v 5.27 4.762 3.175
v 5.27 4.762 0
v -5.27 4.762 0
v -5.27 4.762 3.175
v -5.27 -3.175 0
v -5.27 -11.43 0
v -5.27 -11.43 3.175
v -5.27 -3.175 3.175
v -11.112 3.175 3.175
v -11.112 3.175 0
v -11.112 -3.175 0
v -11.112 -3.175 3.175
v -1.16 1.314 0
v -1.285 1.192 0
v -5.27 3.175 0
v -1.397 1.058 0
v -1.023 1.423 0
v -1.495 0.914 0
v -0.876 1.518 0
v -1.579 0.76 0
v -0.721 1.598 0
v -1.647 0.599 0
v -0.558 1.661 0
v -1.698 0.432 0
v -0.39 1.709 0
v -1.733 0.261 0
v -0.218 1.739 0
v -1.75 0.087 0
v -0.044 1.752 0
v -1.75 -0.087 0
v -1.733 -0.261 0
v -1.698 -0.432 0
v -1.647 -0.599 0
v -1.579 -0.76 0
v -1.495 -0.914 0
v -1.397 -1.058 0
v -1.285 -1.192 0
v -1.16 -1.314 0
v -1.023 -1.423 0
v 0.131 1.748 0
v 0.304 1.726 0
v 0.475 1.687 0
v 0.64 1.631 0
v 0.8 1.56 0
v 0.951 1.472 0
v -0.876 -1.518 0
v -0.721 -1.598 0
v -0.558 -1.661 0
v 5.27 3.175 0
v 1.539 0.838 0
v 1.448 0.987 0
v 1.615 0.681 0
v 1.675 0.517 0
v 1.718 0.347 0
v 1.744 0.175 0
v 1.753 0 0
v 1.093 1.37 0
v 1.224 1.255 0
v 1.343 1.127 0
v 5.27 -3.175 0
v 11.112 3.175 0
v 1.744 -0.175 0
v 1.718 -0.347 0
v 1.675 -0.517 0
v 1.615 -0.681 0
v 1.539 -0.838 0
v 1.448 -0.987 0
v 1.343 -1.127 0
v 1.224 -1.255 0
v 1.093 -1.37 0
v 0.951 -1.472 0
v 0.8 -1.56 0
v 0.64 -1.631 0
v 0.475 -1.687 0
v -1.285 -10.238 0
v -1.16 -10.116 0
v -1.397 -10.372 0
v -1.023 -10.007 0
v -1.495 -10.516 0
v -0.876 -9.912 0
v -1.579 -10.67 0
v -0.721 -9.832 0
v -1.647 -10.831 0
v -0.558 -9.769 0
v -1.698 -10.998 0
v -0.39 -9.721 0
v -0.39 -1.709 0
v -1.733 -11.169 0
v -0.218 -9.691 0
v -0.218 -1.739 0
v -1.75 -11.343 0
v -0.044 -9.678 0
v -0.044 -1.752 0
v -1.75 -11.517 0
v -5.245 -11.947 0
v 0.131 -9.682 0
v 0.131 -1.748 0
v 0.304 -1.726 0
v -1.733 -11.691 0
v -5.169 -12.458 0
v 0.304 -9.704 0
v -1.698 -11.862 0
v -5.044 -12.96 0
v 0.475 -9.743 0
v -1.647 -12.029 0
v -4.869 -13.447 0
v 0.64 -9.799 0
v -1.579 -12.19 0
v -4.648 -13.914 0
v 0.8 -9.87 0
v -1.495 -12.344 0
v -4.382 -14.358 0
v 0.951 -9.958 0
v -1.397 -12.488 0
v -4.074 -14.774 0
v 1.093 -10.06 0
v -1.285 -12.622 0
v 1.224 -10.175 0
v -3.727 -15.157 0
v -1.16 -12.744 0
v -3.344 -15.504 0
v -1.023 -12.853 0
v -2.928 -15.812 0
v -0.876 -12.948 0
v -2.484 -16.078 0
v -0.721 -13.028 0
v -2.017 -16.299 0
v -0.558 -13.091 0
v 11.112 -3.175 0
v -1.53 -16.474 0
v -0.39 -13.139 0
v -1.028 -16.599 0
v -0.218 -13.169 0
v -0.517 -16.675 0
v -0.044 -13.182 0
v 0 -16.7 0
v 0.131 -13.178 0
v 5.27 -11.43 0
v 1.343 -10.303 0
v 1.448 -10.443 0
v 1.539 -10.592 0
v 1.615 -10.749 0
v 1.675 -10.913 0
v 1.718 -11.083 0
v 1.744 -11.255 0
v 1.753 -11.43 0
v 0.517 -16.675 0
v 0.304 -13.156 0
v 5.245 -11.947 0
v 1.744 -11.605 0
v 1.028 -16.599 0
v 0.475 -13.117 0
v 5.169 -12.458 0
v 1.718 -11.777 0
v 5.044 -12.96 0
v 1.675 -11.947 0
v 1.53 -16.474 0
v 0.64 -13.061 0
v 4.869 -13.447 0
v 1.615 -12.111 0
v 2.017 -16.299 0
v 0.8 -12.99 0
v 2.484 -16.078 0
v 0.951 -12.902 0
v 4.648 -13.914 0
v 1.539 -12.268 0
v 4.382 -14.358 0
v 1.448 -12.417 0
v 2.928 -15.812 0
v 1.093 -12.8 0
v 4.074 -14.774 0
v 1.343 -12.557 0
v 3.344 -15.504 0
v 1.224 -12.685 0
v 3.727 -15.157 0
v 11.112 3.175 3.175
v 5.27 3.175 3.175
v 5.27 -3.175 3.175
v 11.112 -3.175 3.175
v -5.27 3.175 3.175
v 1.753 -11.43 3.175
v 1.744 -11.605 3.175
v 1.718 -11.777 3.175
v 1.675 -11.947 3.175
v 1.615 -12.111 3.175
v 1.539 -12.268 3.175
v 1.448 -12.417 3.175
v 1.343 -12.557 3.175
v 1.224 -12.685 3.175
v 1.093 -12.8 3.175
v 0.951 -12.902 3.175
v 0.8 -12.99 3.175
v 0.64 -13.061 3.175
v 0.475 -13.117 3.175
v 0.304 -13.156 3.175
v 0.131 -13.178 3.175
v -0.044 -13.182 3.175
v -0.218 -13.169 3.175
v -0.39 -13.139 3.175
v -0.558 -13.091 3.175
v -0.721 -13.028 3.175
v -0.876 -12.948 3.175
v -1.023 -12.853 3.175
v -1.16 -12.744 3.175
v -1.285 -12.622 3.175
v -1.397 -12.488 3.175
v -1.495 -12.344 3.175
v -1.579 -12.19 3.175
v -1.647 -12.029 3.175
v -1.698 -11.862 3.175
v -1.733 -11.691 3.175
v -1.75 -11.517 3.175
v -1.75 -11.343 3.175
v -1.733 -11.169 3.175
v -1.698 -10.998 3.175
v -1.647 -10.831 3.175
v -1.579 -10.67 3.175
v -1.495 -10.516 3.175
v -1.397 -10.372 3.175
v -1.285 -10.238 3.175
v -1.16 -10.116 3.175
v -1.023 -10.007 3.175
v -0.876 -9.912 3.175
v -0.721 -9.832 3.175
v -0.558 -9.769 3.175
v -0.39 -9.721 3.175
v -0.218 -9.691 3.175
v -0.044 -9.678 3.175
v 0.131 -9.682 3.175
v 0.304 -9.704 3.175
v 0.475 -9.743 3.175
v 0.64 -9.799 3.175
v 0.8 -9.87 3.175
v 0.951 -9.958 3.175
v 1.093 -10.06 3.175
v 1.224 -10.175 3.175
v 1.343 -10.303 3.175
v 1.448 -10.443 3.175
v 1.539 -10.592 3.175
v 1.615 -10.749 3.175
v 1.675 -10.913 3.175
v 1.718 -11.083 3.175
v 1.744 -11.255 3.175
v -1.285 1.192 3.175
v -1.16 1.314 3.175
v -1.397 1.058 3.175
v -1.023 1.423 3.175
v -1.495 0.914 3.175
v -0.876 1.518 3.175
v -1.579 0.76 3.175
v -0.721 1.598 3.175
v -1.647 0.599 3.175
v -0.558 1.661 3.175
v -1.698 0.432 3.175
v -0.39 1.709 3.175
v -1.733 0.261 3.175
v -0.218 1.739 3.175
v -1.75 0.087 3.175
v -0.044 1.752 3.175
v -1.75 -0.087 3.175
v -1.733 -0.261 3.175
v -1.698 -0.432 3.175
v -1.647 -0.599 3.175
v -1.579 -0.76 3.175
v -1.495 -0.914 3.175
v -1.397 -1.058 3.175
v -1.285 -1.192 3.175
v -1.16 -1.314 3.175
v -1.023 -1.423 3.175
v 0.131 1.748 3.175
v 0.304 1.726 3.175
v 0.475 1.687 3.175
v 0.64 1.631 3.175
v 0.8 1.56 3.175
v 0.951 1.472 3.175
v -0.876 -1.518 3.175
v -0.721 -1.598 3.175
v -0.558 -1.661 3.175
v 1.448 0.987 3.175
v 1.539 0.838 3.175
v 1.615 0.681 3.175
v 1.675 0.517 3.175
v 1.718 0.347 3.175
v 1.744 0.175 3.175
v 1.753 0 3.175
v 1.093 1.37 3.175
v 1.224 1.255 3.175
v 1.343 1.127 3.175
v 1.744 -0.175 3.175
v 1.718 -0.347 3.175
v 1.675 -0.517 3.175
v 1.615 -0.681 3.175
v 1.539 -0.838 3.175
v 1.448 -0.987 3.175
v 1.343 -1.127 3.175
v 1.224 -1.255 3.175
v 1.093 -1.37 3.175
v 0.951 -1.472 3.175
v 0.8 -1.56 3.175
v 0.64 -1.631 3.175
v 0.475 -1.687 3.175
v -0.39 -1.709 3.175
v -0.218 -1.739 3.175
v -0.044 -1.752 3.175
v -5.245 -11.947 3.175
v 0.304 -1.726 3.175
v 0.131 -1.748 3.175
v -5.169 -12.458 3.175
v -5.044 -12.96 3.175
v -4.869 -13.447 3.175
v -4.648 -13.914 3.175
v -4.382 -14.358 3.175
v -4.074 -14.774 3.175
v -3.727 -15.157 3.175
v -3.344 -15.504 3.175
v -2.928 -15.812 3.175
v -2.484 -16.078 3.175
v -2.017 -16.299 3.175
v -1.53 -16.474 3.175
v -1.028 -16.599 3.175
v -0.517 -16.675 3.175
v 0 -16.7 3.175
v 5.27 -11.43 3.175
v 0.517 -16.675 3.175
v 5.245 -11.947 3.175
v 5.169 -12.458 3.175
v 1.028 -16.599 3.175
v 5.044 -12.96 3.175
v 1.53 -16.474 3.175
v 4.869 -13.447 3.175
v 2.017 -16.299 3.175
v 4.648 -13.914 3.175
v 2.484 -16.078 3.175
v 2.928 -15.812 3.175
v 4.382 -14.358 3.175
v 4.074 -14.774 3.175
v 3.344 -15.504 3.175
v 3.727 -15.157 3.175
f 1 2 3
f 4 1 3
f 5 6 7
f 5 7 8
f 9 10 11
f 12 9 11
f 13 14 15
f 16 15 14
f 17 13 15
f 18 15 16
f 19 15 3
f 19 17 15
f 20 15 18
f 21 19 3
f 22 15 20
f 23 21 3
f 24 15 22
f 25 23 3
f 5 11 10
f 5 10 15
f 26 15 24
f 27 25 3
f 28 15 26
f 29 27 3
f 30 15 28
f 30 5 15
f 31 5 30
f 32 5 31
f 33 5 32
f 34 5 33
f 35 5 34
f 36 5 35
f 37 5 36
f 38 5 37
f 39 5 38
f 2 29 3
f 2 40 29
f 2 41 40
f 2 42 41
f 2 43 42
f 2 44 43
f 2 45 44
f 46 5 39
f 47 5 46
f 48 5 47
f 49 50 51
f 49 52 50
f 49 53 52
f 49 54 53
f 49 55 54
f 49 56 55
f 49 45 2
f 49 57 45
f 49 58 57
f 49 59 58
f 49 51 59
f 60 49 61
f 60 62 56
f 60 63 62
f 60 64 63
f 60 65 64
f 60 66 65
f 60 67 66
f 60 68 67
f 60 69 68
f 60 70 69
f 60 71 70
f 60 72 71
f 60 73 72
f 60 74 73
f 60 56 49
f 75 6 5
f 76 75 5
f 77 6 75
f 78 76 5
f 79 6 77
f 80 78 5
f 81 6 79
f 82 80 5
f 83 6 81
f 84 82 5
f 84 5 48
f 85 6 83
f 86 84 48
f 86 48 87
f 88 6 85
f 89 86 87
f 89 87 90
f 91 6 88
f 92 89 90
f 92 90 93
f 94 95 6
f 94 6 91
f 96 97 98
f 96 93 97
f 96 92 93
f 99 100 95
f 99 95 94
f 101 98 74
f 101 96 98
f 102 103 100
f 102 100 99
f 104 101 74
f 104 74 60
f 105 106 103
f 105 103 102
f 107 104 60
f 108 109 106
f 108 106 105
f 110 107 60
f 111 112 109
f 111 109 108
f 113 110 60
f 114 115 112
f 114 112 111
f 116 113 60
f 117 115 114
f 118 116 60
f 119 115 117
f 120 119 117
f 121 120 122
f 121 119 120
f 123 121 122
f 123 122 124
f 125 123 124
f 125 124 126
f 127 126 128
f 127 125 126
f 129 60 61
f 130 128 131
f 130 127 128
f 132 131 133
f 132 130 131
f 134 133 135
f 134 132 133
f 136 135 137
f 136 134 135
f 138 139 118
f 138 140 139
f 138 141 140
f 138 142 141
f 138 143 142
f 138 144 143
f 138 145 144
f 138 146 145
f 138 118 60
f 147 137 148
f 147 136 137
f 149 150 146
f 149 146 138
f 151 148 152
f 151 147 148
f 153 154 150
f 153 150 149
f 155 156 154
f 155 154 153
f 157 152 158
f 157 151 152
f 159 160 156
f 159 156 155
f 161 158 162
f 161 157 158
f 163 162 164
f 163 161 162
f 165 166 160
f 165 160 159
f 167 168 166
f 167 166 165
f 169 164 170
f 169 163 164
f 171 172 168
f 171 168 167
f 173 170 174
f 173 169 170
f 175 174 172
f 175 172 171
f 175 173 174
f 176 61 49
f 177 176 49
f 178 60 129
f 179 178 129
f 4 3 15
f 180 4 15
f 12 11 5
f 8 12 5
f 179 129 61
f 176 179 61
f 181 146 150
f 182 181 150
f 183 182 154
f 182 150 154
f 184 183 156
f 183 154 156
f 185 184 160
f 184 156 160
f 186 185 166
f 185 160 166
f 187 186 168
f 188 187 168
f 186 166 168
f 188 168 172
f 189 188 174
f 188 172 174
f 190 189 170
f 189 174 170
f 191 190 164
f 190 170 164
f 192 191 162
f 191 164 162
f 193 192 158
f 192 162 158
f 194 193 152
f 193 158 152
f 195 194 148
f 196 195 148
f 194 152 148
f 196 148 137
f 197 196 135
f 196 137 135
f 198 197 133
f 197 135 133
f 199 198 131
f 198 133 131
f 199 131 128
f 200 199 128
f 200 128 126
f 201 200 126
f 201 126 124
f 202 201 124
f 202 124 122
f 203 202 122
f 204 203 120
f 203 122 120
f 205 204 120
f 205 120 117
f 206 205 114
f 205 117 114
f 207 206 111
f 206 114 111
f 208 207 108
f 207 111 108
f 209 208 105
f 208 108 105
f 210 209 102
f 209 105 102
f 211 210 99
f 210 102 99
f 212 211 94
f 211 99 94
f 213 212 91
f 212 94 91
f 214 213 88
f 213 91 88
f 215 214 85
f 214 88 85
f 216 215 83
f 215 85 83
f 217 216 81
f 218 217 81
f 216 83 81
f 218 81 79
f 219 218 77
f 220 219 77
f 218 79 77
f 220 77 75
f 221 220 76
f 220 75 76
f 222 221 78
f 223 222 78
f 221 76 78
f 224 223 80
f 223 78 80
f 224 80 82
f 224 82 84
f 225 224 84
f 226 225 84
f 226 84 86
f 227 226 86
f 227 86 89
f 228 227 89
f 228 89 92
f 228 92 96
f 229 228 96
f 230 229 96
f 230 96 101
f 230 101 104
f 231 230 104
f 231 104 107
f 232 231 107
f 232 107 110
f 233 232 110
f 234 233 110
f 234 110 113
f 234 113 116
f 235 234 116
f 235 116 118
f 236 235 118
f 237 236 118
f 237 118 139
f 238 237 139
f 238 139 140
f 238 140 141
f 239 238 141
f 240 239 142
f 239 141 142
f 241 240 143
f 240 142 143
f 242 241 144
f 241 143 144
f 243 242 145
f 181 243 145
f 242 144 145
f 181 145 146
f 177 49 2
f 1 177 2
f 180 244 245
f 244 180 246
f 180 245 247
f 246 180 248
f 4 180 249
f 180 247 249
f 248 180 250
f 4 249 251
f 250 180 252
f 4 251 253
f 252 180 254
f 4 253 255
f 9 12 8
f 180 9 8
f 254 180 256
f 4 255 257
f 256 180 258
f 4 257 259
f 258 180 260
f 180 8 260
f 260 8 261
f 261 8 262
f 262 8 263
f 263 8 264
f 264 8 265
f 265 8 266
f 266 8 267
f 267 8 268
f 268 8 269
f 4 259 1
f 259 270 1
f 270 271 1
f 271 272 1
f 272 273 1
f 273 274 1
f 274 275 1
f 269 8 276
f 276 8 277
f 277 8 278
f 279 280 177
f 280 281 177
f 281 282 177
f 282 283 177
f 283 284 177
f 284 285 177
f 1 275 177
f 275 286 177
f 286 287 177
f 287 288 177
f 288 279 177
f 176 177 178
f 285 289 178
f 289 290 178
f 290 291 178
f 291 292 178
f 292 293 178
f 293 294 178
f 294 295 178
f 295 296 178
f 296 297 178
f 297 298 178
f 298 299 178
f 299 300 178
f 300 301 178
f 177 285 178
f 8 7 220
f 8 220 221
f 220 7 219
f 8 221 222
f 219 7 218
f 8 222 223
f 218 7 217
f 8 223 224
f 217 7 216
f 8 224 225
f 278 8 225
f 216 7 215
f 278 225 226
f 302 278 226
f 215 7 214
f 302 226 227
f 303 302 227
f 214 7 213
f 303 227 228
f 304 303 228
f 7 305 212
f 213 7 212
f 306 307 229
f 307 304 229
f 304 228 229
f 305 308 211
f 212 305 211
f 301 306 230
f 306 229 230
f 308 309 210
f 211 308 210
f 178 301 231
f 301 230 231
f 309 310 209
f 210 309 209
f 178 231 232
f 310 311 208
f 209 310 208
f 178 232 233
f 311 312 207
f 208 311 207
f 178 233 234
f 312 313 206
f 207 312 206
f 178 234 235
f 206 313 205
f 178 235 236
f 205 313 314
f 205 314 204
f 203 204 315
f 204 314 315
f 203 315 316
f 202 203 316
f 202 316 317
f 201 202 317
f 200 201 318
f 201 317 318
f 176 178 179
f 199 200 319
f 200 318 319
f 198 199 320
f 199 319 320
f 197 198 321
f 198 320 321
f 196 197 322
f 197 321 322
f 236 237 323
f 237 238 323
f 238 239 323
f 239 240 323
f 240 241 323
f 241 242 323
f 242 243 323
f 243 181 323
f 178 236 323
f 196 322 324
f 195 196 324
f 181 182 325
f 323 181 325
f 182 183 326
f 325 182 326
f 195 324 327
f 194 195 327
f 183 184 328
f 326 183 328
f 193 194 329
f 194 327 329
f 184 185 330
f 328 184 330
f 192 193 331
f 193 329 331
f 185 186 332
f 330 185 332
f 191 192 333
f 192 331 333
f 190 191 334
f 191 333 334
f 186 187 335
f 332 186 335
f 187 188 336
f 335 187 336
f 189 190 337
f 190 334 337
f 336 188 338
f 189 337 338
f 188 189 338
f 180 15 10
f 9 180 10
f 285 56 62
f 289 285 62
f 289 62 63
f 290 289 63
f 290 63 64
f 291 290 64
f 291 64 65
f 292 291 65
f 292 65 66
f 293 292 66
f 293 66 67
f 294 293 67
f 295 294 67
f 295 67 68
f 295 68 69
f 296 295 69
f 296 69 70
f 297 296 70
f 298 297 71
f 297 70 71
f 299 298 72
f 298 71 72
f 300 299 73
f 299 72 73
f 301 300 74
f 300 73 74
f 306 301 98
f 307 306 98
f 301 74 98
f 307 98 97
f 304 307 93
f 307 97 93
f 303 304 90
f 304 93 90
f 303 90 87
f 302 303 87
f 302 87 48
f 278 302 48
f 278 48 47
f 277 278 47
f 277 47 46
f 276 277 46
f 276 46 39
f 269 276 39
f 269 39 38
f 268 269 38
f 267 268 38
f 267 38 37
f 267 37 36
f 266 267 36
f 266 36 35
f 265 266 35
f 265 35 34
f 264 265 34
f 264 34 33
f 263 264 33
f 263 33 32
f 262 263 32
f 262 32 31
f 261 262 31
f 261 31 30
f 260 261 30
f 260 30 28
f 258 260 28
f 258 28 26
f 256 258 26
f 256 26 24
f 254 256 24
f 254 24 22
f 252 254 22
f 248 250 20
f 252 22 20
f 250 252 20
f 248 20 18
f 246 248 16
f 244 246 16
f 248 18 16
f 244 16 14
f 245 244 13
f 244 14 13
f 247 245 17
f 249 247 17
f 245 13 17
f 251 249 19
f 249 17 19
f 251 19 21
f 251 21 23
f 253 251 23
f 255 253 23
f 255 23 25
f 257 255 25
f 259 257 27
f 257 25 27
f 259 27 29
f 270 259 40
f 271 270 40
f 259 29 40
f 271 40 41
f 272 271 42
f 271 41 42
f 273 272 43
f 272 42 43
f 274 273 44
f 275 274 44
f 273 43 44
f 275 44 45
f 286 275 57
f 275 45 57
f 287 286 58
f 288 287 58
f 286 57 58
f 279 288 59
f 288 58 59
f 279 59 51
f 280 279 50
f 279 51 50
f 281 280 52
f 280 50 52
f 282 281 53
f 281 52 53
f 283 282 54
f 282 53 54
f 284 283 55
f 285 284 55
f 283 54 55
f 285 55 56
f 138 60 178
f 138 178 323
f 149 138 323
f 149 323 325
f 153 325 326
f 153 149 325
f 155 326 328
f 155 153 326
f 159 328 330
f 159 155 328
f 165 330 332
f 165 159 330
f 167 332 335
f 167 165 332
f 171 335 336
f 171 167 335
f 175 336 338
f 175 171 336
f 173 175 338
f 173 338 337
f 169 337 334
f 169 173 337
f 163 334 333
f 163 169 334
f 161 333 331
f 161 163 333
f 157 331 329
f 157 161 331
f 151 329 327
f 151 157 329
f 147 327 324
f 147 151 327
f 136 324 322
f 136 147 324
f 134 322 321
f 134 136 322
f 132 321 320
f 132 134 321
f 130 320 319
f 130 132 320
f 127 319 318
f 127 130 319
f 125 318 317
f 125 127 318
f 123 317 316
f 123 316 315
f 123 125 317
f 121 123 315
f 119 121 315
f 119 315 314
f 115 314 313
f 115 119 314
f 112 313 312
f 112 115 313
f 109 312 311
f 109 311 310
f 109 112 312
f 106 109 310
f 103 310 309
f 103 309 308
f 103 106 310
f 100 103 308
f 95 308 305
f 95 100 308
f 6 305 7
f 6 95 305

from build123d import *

# Parameters (mm, degrees)
F1_DEPTH = 3.175
F2_R     = 1.7526
F3_DEPTH = 3.175
F4_R     = 1.7526
F5_DEPTH = 25.4


with BuildPart() as f1:
    # F0 (on Top) → F1 (new body)
    with BuildSketch(Plane.XY):
        Polygon((-5.2705, 3.175), (-11.1125, 3.175), (-11.1125, -3.175), (-5.2705, -3.175), (-5.2705, -4.7625), (5.2705, -4.7625), (5.2705, -3.175), (11.1125, -3.175), (11.1125, 3.175), (5.2705, 3.175), (5.2705, 4.7625), (-5.2705, 4.7625), align=None)
    extrude(amount=F1_DEPTH)

    # F2 (on face) → F3 (join, through all)
    with BuildSketch(Plane(origin=(0, 0, 0), x_dir=(1, 0, 0), z_dir=(0, 0, -1))):
        with BuildLine():
            Line((5.2705, 4.7625), (5.2705, 11.43))
            ThreePointArc((5.2705, 11.43), (0, 16.7005), (-5.2705, 11.43))
            Line((-5.2705, 11.43), (-5.2705, 4.7625))
            Line((-5.2705, 4.7625), (5.2705, 4.7625))
        make_face()
        with Locations((0, 11.43)):
            Circle(F2_R, mode=Mode.SUBTRACT)
    extrude(amount=-F3_DEPTH)

    # F4 (on face) → F5 (cut)
    with BuildSketch(Plane(origin=(0, 0, 0), x_dir=(1, 0, 0), z_dir=(0, 0, -1))):
        Circle(F4_R)
    extrude(amount=-F5_DEPTH, mode=Mode.SUBTRACT)


solid = f1.part
